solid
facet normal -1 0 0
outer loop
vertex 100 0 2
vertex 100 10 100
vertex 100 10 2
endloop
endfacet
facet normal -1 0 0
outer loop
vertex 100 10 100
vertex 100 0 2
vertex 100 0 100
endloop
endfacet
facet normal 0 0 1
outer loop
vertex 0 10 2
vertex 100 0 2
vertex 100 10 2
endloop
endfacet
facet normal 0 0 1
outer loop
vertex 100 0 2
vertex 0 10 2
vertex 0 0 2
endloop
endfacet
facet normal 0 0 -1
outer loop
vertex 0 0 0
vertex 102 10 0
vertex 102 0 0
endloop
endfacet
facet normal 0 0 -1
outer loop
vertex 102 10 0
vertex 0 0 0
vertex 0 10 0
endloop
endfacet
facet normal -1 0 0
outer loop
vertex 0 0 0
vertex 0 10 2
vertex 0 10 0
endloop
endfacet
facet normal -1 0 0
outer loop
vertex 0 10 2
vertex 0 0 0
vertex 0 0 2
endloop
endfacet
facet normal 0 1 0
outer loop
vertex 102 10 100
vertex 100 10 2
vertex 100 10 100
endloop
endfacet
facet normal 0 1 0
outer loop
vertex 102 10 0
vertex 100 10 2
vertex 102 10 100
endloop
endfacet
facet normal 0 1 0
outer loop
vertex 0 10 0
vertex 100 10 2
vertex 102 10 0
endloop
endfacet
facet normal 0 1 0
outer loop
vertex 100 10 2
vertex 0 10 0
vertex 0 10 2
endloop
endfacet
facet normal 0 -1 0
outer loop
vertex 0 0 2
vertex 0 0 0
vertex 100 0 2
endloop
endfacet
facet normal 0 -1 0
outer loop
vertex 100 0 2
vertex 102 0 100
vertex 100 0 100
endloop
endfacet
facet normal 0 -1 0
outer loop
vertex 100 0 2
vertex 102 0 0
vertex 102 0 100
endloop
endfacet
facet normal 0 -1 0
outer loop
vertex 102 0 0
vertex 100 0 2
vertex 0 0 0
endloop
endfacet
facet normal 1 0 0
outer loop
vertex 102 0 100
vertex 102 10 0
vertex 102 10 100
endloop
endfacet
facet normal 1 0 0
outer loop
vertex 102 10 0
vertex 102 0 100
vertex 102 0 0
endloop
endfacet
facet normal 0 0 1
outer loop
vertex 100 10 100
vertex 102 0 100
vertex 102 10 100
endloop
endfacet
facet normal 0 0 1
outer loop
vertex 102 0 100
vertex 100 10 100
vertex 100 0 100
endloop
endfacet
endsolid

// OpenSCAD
width=100;
height=100;

cube([width,10,2]);
translate([width, 0, 0])
cube([2, 10, height]);
